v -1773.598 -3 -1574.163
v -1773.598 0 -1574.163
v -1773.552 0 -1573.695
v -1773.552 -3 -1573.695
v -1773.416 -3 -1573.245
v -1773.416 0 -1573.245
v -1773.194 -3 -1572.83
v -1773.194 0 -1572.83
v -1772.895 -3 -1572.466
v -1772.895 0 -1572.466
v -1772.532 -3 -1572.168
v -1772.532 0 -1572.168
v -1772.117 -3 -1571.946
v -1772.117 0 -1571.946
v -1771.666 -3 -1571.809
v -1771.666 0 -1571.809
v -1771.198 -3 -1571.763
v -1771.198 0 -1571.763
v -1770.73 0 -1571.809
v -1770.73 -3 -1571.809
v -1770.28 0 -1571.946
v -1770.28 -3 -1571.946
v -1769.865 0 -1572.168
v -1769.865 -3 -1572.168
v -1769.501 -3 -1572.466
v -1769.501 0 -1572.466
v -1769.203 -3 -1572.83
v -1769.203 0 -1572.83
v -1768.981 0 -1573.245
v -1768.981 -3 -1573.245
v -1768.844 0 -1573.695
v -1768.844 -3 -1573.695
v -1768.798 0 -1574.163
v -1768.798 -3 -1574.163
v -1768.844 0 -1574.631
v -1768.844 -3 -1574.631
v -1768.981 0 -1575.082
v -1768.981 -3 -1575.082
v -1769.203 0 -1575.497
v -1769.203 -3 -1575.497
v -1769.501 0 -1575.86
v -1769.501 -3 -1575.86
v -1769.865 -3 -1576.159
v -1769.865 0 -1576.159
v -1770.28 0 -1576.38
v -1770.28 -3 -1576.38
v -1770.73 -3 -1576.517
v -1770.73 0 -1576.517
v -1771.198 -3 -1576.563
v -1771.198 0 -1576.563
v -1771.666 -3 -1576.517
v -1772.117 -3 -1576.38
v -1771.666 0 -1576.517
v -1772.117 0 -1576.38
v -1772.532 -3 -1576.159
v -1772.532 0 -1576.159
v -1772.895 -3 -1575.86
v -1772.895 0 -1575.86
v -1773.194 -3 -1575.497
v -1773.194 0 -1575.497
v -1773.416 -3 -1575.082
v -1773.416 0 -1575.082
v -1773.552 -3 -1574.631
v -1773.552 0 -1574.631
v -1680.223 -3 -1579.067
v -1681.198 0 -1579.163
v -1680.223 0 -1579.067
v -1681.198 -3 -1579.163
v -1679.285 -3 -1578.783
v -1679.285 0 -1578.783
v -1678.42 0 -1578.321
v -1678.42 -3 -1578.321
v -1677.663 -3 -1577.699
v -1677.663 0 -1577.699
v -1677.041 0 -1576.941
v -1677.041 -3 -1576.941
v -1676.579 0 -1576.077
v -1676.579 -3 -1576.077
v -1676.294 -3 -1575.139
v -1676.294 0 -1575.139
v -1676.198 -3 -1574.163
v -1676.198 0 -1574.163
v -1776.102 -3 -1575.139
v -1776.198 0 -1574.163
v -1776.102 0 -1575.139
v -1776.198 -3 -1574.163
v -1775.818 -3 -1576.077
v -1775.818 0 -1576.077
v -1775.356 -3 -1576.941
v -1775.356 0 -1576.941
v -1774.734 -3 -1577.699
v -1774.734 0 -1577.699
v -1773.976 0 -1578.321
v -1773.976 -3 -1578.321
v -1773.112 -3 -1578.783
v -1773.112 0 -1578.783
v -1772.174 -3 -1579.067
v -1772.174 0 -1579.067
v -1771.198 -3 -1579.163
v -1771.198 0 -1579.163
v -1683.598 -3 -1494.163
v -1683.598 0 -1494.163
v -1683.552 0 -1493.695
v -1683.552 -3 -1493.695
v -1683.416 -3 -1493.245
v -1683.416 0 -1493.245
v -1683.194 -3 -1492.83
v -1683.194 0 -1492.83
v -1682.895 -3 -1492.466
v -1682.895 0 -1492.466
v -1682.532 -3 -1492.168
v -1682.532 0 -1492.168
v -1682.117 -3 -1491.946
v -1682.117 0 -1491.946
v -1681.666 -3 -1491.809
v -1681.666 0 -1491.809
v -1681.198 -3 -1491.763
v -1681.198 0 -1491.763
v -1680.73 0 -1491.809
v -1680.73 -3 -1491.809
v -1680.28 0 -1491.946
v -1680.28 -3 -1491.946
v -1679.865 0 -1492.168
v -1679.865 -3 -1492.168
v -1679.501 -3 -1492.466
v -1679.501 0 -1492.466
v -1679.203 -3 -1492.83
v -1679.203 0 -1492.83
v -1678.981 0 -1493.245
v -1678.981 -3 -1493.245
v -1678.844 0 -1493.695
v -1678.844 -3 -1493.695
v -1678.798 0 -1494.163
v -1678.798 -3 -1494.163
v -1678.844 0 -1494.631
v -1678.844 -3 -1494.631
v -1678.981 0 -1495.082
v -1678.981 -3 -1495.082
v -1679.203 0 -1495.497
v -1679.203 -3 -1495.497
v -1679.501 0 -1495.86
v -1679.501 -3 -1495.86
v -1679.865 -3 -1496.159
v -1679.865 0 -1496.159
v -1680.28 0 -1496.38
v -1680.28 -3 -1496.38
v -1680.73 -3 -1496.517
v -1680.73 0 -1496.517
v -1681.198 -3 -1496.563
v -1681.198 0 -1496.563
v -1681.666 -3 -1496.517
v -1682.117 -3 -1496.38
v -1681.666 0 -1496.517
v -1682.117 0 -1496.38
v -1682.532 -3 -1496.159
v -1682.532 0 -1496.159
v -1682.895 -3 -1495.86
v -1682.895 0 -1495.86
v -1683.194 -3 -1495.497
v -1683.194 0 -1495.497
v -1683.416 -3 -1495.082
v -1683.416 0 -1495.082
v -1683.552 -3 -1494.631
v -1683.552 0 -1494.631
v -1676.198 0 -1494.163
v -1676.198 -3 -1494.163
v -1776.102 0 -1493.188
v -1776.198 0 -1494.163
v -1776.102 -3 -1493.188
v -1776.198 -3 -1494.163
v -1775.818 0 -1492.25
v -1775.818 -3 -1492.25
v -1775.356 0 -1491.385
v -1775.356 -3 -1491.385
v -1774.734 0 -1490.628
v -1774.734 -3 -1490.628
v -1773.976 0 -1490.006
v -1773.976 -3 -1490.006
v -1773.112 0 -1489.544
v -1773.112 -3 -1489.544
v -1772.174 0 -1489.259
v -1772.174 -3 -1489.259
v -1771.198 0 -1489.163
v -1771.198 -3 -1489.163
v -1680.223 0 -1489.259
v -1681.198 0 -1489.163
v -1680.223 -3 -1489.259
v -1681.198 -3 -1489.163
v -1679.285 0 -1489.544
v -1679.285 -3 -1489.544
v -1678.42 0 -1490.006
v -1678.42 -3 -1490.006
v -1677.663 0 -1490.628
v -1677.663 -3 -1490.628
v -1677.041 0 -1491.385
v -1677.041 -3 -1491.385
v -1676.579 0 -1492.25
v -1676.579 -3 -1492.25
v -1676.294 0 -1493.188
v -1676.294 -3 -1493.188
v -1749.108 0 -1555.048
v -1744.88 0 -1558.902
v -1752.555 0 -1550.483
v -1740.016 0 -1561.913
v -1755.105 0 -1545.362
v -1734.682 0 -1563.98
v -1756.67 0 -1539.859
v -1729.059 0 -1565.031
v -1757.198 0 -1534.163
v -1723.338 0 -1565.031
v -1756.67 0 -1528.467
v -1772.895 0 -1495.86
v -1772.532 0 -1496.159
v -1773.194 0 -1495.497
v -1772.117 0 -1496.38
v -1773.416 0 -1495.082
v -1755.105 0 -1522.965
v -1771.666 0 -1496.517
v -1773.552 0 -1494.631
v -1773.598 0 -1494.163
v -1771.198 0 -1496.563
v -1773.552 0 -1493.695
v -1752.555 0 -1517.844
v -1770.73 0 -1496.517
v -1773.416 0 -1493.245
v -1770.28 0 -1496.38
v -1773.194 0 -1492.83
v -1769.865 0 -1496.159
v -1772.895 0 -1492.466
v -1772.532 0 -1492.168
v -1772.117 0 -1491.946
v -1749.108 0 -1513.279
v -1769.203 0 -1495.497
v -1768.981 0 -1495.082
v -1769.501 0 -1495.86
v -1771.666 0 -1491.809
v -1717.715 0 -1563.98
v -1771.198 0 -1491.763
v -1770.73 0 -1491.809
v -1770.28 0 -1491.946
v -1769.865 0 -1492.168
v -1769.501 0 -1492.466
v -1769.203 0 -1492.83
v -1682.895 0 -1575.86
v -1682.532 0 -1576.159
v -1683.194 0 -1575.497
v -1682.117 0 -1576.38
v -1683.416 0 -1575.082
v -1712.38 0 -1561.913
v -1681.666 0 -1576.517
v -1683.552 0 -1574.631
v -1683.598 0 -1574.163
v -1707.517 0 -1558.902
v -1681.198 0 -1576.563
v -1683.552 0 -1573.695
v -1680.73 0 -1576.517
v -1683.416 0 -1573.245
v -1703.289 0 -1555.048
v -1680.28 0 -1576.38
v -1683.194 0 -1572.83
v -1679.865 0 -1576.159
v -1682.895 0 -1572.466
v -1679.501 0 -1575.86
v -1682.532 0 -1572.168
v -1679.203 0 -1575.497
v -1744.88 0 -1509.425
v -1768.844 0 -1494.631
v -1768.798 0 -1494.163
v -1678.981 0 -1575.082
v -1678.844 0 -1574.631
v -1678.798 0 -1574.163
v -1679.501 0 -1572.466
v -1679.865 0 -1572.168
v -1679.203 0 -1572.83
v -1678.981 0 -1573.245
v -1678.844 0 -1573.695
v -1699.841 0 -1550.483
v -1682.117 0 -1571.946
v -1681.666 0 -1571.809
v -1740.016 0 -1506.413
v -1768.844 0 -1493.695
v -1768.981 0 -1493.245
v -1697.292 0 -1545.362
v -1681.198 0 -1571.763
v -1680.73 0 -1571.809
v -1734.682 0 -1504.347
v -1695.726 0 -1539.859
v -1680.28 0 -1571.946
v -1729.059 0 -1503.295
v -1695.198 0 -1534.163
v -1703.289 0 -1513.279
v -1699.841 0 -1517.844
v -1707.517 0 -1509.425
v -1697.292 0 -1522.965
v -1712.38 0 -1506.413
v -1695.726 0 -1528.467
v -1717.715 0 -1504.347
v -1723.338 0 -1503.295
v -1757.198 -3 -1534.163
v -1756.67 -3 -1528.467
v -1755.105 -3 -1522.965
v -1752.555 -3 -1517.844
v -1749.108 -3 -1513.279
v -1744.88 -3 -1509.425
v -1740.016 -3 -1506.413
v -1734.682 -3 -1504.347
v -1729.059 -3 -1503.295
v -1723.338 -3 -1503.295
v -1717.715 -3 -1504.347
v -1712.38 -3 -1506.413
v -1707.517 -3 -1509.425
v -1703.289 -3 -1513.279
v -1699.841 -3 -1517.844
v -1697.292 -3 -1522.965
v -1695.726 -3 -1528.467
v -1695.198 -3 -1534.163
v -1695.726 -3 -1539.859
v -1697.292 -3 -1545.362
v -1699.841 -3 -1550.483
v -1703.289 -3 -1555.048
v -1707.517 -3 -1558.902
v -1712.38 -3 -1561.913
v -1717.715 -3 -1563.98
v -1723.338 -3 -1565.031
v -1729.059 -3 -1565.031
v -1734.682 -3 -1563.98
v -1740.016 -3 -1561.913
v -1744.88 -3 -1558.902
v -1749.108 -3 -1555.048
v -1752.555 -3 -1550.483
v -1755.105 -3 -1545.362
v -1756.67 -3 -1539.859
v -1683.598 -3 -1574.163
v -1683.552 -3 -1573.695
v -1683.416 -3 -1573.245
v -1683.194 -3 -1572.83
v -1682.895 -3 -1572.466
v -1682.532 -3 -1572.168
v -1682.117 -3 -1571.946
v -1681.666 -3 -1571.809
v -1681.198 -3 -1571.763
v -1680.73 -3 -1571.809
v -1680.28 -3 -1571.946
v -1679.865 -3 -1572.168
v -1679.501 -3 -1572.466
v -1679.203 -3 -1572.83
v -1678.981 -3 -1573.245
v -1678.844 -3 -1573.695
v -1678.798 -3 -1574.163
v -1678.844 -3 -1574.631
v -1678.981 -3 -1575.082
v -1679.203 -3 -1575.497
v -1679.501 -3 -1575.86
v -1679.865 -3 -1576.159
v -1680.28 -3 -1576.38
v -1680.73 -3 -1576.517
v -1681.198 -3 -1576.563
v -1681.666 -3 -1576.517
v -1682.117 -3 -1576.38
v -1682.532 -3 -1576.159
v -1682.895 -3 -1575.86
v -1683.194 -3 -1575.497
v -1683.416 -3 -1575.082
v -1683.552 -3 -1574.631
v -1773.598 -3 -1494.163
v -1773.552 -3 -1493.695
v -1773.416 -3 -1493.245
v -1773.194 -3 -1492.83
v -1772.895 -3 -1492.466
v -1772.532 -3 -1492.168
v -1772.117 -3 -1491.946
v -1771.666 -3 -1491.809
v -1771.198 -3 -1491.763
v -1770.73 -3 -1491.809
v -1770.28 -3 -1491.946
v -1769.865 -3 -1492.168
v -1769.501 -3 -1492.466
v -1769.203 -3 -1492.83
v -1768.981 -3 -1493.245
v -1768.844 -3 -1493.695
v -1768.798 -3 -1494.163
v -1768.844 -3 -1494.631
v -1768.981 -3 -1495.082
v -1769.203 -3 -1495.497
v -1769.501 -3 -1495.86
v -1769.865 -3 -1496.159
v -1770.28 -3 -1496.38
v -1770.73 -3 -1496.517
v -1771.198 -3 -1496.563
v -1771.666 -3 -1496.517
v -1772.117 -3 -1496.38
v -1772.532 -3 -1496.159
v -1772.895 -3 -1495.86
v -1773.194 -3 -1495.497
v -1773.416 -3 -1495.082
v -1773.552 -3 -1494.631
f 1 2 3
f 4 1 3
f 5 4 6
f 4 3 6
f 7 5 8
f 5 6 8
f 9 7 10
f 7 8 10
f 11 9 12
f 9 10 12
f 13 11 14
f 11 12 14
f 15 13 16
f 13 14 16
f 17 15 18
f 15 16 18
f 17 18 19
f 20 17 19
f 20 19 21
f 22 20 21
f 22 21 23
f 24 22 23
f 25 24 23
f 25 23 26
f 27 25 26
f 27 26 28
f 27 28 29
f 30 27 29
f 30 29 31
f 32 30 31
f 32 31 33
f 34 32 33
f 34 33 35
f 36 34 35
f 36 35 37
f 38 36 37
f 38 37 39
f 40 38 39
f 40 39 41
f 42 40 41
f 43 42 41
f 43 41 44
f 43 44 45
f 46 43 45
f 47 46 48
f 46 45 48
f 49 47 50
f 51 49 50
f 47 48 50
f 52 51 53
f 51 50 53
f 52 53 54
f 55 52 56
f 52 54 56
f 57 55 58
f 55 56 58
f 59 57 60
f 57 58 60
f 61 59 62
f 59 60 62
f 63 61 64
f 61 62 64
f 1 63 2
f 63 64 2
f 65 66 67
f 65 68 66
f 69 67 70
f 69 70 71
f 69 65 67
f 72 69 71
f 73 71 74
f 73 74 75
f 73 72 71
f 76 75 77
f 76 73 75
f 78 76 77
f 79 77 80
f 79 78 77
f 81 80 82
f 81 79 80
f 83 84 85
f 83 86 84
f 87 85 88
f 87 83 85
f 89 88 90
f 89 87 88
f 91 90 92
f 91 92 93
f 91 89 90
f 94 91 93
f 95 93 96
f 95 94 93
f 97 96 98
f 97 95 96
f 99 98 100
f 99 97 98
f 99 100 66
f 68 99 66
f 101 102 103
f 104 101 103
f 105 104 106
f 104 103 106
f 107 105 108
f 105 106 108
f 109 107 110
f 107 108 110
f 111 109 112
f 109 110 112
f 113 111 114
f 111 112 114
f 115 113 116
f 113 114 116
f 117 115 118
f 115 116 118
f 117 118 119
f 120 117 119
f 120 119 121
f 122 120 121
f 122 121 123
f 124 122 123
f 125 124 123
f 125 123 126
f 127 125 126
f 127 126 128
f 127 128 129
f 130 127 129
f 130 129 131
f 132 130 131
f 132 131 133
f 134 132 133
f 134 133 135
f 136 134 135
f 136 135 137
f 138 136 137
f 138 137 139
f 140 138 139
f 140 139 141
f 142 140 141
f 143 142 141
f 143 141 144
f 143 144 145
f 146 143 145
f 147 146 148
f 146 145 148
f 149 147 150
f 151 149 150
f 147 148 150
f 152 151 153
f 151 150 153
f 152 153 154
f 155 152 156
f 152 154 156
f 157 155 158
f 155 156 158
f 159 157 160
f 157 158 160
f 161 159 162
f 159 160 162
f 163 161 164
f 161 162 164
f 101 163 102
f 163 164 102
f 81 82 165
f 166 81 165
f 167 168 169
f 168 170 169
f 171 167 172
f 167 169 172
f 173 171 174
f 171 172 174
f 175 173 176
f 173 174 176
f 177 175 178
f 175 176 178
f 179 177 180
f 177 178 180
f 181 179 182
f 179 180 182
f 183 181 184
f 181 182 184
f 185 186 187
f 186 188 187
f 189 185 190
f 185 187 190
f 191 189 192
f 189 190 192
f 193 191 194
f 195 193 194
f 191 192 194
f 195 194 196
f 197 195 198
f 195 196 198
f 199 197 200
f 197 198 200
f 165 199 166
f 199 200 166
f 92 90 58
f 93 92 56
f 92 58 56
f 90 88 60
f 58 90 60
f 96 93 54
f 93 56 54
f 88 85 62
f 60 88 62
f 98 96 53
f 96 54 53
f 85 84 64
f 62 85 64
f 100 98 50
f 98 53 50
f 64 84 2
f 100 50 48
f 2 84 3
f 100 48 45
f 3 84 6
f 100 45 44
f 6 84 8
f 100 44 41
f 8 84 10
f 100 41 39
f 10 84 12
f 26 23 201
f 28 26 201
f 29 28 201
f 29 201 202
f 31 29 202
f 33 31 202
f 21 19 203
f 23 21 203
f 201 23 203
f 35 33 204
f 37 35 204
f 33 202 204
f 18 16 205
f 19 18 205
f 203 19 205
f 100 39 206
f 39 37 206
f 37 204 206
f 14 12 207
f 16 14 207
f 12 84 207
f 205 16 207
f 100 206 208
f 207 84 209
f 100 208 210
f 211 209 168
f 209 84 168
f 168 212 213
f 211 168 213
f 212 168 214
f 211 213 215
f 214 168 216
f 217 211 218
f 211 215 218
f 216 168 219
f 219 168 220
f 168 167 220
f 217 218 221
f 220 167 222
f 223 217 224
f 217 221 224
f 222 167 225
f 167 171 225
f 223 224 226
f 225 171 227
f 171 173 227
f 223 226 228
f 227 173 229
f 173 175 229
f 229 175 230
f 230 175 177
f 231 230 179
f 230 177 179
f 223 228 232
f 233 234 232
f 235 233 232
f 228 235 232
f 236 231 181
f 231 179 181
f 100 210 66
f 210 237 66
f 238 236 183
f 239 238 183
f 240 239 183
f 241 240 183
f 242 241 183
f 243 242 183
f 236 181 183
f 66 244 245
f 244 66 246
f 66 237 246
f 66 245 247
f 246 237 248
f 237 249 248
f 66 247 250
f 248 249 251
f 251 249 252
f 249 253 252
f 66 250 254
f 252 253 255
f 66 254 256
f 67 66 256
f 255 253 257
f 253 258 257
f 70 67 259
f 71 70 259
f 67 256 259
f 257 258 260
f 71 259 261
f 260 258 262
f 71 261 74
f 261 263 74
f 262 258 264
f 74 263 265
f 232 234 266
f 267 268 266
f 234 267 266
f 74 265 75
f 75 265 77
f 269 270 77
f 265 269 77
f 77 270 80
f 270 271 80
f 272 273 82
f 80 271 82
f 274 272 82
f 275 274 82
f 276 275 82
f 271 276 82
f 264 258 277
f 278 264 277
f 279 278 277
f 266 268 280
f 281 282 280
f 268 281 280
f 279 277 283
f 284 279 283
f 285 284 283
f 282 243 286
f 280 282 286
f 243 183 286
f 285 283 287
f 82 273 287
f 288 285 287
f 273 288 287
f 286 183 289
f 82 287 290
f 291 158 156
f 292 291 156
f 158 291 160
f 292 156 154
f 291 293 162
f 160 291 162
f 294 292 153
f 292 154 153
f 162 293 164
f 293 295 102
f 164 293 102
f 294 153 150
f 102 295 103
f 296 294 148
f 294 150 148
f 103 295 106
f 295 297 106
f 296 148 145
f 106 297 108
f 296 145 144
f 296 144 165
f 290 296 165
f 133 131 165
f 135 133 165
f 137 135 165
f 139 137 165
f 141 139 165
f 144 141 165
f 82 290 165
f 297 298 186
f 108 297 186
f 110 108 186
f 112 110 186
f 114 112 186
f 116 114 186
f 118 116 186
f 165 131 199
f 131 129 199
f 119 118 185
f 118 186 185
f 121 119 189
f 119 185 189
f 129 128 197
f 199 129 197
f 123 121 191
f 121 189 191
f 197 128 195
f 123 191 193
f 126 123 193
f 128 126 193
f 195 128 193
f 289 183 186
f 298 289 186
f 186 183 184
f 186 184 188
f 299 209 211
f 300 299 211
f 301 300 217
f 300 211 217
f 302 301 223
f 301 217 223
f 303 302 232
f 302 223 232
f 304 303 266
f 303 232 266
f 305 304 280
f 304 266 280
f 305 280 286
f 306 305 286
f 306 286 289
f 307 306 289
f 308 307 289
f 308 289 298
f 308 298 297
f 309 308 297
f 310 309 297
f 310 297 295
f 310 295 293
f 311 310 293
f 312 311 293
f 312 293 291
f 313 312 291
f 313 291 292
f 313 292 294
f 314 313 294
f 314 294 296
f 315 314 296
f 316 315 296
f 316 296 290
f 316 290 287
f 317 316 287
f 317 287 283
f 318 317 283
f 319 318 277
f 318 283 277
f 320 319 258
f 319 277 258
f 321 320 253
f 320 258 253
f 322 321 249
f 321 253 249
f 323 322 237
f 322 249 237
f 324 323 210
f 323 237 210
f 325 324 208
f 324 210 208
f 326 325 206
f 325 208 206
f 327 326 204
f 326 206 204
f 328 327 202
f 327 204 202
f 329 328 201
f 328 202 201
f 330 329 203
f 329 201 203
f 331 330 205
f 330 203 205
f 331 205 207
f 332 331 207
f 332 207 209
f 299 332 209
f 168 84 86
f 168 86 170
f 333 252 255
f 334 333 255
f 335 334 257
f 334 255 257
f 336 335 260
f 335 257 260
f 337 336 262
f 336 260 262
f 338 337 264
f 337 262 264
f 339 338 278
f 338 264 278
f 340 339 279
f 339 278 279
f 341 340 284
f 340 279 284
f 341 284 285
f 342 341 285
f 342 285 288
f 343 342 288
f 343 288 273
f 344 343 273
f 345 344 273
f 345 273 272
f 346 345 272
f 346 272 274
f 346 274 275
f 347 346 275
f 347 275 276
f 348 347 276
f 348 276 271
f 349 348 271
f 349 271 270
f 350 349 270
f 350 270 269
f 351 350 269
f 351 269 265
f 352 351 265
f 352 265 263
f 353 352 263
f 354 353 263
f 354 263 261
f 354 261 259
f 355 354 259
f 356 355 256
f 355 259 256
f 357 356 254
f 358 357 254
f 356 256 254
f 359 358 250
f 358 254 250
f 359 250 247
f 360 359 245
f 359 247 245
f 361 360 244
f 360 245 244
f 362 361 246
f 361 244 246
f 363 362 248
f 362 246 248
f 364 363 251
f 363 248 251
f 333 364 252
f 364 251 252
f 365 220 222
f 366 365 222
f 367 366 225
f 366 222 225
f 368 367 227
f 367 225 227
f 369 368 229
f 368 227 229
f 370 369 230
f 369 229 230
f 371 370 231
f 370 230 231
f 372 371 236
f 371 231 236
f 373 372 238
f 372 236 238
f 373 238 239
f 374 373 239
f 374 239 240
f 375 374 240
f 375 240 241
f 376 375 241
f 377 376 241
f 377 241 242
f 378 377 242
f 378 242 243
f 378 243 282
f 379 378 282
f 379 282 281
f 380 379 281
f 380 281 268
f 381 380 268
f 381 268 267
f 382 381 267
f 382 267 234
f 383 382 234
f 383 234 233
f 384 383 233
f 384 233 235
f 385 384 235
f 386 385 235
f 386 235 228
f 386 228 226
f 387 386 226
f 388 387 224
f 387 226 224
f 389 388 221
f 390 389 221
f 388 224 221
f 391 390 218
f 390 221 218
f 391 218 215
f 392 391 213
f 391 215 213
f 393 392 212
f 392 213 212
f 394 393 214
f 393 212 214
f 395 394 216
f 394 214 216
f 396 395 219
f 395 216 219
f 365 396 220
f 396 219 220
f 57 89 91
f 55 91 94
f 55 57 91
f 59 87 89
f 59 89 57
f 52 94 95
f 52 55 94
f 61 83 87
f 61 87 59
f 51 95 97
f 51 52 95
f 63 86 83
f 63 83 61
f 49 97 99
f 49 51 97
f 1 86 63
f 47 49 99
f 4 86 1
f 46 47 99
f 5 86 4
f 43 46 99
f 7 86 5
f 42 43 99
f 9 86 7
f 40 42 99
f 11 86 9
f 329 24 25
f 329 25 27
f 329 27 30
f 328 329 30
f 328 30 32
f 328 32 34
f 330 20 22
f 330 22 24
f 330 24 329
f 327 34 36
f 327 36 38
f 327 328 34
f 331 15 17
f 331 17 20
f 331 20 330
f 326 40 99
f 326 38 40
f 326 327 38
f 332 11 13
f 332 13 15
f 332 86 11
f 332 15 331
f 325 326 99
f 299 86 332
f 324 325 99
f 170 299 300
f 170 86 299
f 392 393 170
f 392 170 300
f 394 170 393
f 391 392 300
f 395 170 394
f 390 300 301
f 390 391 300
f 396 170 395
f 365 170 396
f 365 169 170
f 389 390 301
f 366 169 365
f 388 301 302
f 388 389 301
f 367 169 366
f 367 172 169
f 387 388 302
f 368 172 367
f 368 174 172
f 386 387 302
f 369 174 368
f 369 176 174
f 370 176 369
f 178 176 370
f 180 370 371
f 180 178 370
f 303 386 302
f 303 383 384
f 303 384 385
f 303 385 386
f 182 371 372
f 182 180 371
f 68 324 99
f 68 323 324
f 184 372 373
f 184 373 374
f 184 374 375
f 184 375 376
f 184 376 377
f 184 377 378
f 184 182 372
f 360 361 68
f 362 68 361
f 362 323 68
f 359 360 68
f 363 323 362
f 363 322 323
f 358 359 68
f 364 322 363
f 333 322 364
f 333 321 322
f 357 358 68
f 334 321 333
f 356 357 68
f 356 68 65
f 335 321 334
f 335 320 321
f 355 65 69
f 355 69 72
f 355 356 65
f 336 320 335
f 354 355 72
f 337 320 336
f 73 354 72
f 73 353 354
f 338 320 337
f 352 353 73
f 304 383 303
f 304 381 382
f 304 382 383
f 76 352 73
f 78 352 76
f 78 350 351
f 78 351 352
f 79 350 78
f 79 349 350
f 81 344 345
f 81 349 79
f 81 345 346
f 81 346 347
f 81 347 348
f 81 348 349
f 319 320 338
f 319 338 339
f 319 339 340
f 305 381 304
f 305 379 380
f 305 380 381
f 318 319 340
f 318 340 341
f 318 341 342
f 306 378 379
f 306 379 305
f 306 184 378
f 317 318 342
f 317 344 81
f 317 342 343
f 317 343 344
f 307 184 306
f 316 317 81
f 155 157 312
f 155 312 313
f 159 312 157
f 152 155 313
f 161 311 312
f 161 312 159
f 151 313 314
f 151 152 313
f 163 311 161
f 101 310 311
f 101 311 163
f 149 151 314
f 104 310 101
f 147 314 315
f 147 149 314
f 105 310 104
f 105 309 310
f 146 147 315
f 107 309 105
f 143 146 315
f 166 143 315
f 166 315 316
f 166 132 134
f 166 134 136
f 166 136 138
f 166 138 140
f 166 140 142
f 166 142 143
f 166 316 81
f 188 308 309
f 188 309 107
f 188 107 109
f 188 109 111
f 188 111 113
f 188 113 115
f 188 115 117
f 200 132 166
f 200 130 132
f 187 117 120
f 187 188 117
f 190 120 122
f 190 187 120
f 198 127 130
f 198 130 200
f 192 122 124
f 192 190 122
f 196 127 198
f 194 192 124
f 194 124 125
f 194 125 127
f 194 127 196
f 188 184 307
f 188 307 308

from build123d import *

# Parameters (mm, degrees)
F0_W     = 100
F0_H     = 90
F1_DEPTH = 3
F3_D     = 4.8
F3_DEPTH = 10
F4_R     = 5
F6_D     = 62
F6_DEPTH = 10


with BuildPart() as f1:
    # F0 (on Front) → F1 (new body)
    with BuildSketch(Plane.XZ):
        with Locations((-1726.19823, -1534.163168)):
            Rectangle(F0_W, F0_H)
    extrude(amount=F1_DEPTH)

    # F3
    with Locations(Plane.XZ.offset(3)):
        with Locations((-1771.19823, -1494.163168), (-1681.19823, -1494.163168), (-1681.19823, -1574.163168), (-1771.19823, -1574.163168)):
            Hole(F3_D / 2, depth=F3_DEPTH)

    # F4
    f4_edges = [f1.edges().sort_by_distance(p)[0] for p in [
        (-1676.19823, -1.5, -1489.163168),
        (-1676.19823, -1.5, -1579.163168),
        (-1776.19823, -1.5, -1489.163168),
        (-1776.19823, -1.5, -1579.163168),
    ]]
    fillet(f4_edges, radius=F4_R)

    # F6
    with Locations(Plane.XZ.offset(3)):
        with Locations((-1726.19823, -1534.163168)):
            Hole(F6_D / 2, depth=F6_DEPTH)


solid = f1.part
